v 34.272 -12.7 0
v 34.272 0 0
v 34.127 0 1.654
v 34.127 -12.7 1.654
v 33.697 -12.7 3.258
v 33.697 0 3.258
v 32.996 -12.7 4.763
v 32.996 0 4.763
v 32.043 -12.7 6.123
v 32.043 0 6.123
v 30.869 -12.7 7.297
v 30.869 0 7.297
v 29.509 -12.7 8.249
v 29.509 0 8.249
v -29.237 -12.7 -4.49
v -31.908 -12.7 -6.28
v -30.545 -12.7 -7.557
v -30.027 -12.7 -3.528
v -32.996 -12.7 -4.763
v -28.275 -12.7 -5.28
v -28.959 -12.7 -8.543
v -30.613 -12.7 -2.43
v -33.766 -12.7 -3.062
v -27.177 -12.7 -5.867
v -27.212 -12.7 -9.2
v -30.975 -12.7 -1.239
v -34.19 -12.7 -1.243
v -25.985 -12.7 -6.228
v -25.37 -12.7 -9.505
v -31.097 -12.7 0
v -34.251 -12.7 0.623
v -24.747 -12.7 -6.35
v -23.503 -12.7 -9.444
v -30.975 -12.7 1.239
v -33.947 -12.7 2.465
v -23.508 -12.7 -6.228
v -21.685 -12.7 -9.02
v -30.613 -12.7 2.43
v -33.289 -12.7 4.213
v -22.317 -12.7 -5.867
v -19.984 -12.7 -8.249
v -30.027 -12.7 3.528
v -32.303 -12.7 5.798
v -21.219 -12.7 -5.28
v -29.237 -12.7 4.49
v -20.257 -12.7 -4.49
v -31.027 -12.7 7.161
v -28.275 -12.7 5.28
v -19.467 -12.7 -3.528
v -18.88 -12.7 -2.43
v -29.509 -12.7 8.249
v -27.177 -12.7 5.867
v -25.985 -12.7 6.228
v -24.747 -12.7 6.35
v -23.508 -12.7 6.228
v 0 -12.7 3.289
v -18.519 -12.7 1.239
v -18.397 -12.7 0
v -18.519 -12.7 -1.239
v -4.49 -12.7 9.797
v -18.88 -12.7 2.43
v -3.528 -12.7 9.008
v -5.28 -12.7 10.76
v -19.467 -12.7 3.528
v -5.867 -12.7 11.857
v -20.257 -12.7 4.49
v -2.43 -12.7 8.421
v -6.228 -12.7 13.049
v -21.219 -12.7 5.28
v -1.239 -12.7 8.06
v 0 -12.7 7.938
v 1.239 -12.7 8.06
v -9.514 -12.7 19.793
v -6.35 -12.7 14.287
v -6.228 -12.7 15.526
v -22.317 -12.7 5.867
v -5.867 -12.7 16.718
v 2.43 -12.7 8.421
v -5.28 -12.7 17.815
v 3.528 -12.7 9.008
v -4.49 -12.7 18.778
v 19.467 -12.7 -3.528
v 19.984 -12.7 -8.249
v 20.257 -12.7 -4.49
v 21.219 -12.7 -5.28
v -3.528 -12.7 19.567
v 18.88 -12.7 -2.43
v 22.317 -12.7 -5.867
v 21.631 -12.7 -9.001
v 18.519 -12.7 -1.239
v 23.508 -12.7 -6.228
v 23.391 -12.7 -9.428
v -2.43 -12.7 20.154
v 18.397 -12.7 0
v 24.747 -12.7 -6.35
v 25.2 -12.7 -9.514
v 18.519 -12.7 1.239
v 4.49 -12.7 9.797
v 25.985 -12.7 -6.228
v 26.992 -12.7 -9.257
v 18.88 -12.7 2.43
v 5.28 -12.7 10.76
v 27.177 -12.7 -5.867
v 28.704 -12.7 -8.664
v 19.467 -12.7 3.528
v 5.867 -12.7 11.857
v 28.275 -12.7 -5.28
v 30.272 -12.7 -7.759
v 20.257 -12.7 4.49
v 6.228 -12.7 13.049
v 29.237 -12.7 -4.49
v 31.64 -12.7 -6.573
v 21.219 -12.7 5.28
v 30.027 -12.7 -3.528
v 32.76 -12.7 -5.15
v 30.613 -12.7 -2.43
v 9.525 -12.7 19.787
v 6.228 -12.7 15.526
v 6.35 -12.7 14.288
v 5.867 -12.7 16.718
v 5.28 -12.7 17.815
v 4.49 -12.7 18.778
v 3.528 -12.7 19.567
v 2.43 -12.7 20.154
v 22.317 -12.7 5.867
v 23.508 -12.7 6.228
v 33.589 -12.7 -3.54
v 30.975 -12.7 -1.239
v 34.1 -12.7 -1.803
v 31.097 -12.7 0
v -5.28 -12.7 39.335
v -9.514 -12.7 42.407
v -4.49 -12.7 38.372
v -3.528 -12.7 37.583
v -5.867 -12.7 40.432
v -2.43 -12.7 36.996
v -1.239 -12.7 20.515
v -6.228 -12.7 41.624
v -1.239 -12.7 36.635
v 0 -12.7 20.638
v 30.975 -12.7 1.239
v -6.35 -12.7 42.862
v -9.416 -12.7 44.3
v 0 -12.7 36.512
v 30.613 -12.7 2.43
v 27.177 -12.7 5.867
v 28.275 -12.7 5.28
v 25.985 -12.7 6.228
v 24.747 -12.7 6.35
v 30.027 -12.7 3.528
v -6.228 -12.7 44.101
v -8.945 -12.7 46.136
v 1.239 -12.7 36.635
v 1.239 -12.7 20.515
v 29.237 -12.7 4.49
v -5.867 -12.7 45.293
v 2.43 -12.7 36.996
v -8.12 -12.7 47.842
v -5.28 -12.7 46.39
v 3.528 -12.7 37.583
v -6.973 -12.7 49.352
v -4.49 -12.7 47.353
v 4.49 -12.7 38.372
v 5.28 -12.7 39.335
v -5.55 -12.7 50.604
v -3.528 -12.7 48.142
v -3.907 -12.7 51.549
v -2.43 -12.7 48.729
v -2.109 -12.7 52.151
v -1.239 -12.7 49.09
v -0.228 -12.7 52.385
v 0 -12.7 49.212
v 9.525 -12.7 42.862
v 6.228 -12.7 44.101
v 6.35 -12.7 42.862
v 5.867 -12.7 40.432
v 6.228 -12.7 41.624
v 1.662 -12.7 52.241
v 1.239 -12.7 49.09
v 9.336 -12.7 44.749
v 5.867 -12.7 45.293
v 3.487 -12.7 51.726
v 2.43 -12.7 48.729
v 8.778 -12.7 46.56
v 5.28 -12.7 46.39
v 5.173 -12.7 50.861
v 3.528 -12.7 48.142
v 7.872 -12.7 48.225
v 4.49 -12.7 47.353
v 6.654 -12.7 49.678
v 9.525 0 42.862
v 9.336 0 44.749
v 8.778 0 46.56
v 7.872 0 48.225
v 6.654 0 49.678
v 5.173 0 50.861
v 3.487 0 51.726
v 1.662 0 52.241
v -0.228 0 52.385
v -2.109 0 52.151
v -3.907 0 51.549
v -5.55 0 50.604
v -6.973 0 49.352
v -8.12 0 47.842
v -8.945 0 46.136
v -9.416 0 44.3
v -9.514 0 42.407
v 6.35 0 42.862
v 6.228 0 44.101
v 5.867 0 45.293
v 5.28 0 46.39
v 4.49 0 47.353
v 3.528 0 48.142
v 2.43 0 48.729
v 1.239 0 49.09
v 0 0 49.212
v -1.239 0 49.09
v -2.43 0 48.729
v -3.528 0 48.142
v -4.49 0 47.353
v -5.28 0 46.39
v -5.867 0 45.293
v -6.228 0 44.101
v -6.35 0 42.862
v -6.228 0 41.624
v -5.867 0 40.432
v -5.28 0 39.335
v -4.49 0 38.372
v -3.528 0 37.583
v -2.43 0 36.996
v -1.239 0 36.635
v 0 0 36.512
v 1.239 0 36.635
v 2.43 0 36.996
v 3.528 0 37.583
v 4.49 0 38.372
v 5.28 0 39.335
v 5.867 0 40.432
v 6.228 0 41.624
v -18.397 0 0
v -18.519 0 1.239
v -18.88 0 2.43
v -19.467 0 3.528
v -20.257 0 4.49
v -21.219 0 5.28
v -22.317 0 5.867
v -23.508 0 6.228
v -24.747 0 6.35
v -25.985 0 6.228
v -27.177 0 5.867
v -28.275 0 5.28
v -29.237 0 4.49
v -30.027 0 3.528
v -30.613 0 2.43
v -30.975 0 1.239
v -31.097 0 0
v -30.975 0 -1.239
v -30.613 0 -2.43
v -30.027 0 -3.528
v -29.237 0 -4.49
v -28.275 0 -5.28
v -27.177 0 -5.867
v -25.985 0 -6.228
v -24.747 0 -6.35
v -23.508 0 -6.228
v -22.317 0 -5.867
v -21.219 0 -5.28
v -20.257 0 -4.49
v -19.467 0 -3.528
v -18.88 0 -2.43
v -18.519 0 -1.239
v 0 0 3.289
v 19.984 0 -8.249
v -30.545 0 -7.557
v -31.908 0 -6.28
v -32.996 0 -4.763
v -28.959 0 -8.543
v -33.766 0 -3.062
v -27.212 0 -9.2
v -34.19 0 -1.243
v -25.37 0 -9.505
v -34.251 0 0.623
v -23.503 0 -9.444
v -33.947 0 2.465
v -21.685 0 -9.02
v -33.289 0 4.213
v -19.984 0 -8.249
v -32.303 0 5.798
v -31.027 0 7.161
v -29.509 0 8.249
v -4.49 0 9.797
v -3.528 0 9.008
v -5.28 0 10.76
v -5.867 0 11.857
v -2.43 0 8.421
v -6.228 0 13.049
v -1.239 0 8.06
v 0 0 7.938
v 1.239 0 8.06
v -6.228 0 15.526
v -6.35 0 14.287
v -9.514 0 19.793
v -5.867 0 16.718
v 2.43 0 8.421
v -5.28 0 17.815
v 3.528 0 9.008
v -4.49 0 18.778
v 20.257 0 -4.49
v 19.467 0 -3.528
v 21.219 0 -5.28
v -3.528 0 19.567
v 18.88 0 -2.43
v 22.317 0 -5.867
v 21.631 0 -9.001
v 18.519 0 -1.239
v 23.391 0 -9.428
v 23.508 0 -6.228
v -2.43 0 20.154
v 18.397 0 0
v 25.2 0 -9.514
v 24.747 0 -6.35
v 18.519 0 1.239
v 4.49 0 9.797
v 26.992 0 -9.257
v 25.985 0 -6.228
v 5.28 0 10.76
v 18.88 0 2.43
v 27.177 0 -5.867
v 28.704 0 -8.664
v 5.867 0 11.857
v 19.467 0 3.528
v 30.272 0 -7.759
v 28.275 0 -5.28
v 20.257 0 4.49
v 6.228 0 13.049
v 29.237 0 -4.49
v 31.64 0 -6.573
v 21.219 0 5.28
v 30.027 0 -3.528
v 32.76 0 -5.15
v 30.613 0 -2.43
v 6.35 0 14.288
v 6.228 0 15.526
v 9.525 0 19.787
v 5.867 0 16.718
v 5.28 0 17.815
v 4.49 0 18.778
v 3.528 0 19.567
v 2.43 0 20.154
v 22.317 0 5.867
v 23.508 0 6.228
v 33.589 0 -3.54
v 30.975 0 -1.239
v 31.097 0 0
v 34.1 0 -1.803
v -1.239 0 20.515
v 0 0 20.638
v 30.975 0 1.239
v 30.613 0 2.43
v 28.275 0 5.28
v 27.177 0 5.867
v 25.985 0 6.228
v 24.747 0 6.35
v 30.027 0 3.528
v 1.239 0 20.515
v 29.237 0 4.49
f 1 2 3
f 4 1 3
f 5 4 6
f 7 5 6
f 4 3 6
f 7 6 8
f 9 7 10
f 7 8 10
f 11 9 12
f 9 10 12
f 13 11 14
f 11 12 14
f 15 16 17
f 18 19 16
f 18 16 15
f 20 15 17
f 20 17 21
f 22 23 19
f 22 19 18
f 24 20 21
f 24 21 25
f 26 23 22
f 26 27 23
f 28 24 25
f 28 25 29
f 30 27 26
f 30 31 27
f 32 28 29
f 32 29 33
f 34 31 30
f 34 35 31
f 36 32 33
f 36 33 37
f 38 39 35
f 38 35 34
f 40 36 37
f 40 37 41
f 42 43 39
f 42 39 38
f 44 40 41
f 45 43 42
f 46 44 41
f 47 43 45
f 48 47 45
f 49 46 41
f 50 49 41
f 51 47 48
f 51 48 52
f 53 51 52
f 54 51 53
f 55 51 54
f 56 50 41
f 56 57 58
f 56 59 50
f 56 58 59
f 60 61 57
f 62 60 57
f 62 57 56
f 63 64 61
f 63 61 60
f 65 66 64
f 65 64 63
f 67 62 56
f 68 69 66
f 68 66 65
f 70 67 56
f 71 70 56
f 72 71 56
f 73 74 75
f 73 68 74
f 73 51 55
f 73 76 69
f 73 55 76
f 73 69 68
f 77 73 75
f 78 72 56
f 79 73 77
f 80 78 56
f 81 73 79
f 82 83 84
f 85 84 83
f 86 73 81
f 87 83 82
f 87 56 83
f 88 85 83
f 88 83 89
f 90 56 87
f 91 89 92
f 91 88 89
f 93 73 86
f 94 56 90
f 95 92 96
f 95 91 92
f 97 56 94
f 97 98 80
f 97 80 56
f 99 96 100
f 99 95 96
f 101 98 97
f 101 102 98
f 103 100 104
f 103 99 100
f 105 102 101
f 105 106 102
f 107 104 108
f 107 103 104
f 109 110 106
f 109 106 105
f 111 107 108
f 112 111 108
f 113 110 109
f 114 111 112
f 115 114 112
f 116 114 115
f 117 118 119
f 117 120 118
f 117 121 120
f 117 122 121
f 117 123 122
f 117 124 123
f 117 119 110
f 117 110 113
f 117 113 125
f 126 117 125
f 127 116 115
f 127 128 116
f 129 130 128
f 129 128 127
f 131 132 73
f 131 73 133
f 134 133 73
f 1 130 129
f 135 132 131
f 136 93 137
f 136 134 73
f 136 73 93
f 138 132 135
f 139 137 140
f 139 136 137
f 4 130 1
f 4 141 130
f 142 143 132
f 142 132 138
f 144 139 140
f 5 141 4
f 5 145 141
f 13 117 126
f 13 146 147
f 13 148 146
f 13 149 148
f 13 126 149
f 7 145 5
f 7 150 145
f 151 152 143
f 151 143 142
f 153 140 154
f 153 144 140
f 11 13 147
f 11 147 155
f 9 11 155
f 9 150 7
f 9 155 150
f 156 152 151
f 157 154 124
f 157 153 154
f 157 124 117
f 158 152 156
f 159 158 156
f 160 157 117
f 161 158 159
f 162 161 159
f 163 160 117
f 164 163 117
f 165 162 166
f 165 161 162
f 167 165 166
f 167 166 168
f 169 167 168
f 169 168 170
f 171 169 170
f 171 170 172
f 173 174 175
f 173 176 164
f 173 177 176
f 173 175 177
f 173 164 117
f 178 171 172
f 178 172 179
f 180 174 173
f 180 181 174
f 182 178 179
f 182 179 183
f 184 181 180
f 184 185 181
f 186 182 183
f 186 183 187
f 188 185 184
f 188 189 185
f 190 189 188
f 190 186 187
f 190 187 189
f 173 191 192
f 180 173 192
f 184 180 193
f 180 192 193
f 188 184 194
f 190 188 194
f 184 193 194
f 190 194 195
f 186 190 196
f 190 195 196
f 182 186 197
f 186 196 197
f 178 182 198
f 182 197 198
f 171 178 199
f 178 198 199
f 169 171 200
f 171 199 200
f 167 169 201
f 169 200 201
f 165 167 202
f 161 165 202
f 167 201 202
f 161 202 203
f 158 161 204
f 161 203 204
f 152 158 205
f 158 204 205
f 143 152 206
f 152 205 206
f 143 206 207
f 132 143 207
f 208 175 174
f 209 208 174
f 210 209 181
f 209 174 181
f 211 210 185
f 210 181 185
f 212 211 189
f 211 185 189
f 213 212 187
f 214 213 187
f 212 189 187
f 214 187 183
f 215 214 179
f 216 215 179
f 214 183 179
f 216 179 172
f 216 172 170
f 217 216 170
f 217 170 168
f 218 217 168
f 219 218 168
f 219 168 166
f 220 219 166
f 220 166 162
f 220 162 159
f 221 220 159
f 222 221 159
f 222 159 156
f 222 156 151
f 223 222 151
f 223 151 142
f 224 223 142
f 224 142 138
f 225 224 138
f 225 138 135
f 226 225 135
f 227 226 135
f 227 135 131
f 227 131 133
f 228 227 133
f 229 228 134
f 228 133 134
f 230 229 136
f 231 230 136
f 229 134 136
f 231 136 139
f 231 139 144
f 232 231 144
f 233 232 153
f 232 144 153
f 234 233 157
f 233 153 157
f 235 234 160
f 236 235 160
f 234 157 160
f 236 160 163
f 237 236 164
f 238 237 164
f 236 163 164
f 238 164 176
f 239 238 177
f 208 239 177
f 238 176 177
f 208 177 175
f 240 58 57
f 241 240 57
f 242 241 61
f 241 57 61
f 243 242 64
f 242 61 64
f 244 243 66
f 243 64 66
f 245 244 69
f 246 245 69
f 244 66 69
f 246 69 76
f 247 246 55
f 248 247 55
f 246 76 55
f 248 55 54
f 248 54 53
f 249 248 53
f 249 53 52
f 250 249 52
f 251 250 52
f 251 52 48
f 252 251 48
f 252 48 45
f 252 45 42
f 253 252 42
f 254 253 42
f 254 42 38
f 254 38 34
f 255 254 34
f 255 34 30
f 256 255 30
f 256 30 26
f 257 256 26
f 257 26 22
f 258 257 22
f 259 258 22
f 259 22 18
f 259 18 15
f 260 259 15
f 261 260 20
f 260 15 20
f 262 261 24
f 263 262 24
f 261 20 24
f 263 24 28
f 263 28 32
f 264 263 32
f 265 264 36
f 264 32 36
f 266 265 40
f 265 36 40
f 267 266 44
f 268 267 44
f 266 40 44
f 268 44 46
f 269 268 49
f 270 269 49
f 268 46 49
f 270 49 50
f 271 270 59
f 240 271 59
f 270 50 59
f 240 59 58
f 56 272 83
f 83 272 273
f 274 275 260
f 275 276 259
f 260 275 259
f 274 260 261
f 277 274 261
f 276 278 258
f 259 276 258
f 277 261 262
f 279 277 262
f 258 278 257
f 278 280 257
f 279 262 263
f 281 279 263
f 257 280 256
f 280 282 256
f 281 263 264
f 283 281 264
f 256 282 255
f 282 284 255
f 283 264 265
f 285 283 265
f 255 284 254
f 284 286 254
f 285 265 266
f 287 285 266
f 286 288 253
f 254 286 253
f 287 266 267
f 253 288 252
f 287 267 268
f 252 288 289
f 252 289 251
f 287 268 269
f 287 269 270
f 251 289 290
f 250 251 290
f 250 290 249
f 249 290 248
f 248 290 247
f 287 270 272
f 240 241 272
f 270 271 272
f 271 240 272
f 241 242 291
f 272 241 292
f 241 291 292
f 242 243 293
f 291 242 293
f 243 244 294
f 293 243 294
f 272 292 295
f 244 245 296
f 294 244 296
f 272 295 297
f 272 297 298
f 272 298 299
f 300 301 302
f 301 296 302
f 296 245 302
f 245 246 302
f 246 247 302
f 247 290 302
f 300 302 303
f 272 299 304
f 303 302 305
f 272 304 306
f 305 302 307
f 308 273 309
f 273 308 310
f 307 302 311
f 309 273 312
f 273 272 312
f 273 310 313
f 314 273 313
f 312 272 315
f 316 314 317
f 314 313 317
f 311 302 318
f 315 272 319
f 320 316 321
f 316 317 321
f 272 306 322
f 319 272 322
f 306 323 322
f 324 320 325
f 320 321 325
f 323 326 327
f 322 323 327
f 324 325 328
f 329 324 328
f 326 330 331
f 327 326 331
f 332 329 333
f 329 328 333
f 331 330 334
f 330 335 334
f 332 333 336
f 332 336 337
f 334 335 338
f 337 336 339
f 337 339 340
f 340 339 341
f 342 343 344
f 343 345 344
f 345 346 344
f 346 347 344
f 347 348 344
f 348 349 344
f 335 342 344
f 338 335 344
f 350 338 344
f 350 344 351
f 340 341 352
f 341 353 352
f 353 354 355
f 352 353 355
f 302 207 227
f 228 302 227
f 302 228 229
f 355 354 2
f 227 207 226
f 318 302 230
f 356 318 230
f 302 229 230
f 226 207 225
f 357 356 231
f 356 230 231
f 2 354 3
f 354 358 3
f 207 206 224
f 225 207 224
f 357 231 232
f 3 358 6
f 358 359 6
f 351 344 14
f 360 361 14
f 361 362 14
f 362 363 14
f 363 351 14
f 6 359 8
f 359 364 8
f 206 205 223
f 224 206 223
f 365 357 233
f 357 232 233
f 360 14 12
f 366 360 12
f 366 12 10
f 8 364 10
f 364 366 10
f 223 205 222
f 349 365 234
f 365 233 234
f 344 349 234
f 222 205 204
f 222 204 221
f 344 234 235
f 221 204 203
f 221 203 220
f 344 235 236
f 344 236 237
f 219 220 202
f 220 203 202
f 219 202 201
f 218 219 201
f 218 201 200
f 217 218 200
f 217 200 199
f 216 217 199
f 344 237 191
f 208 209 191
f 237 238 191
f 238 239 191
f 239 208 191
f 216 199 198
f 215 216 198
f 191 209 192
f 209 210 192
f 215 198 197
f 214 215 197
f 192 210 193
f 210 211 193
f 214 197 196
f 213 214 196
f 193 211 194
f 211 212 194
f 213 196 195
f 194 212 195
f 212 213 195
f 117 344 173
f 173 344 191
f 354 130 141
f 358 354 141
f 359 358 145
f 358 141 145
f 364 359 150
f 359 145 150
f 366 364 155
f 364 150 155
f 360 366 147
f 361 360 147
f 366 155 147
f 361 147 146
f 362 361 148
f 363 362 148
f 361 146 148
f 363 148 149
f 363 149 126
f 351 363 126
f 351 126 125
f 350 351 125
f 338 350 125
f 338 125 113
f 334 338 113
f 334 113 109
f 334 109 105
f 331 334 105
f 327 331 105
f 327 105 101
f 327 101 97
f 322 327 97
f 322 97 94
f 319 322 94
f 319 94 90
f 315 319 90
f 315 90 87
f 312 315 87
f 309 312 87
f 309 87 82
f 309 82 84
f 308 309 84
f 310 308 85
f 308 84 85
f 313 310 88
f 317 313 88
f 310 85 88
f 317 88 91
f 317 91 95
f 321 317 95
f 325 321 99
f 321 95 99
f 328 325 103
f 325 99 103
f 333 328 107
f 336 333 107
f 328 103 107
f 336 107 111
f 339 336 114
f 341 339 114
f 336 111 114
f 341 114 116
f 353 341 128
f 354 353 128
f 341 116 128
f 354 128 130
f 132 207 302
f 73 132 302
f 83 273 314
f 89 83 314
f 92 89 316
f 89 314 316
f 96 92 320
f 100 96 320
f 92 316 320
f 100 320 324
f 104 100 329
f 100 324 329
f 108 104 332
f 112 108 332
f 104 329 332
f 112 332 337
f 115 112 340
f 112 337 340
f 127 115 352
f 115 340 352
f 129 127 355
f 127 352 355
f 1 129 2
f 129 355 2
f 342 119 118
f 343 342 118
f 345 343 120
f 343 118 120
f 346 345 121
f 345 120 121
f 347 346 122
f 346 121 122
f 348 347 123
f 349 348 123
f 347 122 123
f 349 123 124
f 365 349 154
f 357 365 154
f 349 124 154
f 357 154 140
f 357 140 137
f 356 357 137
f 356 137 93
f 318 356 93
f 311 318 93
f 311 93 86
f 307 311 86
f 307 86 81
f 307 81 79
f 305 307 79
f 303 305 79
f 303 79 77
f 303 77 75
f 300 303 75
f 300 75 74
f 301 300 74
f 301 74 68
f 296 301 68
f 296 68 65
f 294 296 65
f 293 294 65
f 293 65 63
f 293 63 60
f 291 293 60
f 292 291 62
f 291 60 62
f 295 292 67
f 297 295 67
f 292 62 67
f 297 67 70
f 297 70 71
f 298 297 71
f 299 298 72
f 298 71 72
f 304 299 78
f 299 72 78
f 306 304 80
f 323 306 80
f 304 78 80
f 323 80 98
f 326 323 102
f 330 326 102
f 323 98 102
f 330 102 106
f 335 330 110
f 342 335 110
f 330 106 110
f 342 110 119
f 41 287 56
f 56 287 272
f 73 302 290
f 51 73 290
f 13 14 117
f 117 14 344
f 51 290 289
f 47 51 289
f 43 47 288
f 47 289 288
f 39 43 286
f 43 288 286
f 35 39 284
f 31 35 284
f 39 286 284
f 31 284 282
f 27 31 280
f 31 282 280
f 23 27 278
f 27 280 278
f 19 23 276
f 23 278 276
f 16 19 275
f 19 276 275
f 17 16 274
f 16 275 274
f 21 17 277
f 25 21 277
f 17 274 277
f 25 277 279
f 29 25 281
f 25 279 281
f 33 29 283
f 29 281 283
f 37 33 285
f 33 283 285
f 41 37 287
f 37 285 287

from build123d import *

# Parameters (mm, degrees)
F1_DEPTH = 12.7
F2_R     = 6.35
F3_DEPTH = 12.701


with BuildPart() as f1:
    # F0 (on Front) → F1 (new body)
    with BuildSketch(Plane.XZ):
        with BuildLine():
            ThreePointArc((-9.5140915631, 42.4067734045), (0.2279285655, 33.3402274997), (9.525, 42.8625))
            ThreePointArc((9.525, 42.8625), (-0.2279285655, 52.3847725003), (-9.5140915631, 42.4067734045))
        make_face()
        with BuildLine():
            Line((9.525, 19.786761314), (9.525, 42.8625))
            ThreePointArc((9.525, 42.8625), (0.2279285655, 33.3402274997), (-9.5140915631, 42.4067734045))
            Line((-9.5140915631, 42.4067734045), (-9.5140915631, 19.793059303))
            Line((-9.5140915631, 19.793059303), (-29.5091759131, 8.248891971))
            ThreePointArc((-29.5091759131, 8.248891971), (-19.9841759131, 8.248891971), (-15.2216759131, 0))
            ThreePointArc((-15.2216759131, 0), (-16.4977839421, -4.7625), (-19.9841759131, -8.248891971))
            Line((-19.9841759131, -8.248891971), (0, 3.2889773719))
            Line((0, 3.2889773719), (19.9841759131, -8.248891971))
            ThreePointArc((19.9841759131, -8.248891971), (16.4977839421, 4.7625), (29.5091759131, 8.248891971))
            Line((29.5091759131, 8.248891971), (9.525, 19.786761314))
        make_face()
        with BuildLine():
            ThreePointArc((-15.2216759131, 0), (-19.9841759131, 8.248891971), (-29.5091759131, 8.248891971))
            ThreePointArc((-29.5091759131, 8.248891971), (-32.9955678842, -4.7625), (-19.9841759131, -8.248891971))
            ThreePointArc((-19.9841759131, -8.248891971), (-16.4977839421, -4.7625), (-15.2216759131, 0))
        make_face()
        with BuildLine():
            ThreePointArc((34.2716759131, 0), (32.9955678842, 4.7625), (29.5091759131, 8.248891971))
            ThreePointArc((29.5091759131, 8.248891971), (16.4977839421, 4.7625), (19.9841759131, -8.248891971))
            ThreePointArc((19.9841759131, -8.248891971), (29.5091759131, -8.248891971), (34.2716759131, 0))
        make_face()
    extrude(amount=F1_DEPTH)

    # F2 (on face) → F3 (cut, through all)
    with BuildSketch(Plane.XZ.offset(12.7)):
        with Locations((-24.7466759131, 0)):
            Circle(F2_R)
        with Locations((0, 14.2875)):
            Circle(F2_R)
        with Locations((0, 42.8625)):
            Circle(F2_R)
        with Locations((24.7466759131, 0)):
            Circle(F2_R)
    extrude(amount=-F3_DEPTH, mode=Mode.SUBTRACT)


solid = f1.part
